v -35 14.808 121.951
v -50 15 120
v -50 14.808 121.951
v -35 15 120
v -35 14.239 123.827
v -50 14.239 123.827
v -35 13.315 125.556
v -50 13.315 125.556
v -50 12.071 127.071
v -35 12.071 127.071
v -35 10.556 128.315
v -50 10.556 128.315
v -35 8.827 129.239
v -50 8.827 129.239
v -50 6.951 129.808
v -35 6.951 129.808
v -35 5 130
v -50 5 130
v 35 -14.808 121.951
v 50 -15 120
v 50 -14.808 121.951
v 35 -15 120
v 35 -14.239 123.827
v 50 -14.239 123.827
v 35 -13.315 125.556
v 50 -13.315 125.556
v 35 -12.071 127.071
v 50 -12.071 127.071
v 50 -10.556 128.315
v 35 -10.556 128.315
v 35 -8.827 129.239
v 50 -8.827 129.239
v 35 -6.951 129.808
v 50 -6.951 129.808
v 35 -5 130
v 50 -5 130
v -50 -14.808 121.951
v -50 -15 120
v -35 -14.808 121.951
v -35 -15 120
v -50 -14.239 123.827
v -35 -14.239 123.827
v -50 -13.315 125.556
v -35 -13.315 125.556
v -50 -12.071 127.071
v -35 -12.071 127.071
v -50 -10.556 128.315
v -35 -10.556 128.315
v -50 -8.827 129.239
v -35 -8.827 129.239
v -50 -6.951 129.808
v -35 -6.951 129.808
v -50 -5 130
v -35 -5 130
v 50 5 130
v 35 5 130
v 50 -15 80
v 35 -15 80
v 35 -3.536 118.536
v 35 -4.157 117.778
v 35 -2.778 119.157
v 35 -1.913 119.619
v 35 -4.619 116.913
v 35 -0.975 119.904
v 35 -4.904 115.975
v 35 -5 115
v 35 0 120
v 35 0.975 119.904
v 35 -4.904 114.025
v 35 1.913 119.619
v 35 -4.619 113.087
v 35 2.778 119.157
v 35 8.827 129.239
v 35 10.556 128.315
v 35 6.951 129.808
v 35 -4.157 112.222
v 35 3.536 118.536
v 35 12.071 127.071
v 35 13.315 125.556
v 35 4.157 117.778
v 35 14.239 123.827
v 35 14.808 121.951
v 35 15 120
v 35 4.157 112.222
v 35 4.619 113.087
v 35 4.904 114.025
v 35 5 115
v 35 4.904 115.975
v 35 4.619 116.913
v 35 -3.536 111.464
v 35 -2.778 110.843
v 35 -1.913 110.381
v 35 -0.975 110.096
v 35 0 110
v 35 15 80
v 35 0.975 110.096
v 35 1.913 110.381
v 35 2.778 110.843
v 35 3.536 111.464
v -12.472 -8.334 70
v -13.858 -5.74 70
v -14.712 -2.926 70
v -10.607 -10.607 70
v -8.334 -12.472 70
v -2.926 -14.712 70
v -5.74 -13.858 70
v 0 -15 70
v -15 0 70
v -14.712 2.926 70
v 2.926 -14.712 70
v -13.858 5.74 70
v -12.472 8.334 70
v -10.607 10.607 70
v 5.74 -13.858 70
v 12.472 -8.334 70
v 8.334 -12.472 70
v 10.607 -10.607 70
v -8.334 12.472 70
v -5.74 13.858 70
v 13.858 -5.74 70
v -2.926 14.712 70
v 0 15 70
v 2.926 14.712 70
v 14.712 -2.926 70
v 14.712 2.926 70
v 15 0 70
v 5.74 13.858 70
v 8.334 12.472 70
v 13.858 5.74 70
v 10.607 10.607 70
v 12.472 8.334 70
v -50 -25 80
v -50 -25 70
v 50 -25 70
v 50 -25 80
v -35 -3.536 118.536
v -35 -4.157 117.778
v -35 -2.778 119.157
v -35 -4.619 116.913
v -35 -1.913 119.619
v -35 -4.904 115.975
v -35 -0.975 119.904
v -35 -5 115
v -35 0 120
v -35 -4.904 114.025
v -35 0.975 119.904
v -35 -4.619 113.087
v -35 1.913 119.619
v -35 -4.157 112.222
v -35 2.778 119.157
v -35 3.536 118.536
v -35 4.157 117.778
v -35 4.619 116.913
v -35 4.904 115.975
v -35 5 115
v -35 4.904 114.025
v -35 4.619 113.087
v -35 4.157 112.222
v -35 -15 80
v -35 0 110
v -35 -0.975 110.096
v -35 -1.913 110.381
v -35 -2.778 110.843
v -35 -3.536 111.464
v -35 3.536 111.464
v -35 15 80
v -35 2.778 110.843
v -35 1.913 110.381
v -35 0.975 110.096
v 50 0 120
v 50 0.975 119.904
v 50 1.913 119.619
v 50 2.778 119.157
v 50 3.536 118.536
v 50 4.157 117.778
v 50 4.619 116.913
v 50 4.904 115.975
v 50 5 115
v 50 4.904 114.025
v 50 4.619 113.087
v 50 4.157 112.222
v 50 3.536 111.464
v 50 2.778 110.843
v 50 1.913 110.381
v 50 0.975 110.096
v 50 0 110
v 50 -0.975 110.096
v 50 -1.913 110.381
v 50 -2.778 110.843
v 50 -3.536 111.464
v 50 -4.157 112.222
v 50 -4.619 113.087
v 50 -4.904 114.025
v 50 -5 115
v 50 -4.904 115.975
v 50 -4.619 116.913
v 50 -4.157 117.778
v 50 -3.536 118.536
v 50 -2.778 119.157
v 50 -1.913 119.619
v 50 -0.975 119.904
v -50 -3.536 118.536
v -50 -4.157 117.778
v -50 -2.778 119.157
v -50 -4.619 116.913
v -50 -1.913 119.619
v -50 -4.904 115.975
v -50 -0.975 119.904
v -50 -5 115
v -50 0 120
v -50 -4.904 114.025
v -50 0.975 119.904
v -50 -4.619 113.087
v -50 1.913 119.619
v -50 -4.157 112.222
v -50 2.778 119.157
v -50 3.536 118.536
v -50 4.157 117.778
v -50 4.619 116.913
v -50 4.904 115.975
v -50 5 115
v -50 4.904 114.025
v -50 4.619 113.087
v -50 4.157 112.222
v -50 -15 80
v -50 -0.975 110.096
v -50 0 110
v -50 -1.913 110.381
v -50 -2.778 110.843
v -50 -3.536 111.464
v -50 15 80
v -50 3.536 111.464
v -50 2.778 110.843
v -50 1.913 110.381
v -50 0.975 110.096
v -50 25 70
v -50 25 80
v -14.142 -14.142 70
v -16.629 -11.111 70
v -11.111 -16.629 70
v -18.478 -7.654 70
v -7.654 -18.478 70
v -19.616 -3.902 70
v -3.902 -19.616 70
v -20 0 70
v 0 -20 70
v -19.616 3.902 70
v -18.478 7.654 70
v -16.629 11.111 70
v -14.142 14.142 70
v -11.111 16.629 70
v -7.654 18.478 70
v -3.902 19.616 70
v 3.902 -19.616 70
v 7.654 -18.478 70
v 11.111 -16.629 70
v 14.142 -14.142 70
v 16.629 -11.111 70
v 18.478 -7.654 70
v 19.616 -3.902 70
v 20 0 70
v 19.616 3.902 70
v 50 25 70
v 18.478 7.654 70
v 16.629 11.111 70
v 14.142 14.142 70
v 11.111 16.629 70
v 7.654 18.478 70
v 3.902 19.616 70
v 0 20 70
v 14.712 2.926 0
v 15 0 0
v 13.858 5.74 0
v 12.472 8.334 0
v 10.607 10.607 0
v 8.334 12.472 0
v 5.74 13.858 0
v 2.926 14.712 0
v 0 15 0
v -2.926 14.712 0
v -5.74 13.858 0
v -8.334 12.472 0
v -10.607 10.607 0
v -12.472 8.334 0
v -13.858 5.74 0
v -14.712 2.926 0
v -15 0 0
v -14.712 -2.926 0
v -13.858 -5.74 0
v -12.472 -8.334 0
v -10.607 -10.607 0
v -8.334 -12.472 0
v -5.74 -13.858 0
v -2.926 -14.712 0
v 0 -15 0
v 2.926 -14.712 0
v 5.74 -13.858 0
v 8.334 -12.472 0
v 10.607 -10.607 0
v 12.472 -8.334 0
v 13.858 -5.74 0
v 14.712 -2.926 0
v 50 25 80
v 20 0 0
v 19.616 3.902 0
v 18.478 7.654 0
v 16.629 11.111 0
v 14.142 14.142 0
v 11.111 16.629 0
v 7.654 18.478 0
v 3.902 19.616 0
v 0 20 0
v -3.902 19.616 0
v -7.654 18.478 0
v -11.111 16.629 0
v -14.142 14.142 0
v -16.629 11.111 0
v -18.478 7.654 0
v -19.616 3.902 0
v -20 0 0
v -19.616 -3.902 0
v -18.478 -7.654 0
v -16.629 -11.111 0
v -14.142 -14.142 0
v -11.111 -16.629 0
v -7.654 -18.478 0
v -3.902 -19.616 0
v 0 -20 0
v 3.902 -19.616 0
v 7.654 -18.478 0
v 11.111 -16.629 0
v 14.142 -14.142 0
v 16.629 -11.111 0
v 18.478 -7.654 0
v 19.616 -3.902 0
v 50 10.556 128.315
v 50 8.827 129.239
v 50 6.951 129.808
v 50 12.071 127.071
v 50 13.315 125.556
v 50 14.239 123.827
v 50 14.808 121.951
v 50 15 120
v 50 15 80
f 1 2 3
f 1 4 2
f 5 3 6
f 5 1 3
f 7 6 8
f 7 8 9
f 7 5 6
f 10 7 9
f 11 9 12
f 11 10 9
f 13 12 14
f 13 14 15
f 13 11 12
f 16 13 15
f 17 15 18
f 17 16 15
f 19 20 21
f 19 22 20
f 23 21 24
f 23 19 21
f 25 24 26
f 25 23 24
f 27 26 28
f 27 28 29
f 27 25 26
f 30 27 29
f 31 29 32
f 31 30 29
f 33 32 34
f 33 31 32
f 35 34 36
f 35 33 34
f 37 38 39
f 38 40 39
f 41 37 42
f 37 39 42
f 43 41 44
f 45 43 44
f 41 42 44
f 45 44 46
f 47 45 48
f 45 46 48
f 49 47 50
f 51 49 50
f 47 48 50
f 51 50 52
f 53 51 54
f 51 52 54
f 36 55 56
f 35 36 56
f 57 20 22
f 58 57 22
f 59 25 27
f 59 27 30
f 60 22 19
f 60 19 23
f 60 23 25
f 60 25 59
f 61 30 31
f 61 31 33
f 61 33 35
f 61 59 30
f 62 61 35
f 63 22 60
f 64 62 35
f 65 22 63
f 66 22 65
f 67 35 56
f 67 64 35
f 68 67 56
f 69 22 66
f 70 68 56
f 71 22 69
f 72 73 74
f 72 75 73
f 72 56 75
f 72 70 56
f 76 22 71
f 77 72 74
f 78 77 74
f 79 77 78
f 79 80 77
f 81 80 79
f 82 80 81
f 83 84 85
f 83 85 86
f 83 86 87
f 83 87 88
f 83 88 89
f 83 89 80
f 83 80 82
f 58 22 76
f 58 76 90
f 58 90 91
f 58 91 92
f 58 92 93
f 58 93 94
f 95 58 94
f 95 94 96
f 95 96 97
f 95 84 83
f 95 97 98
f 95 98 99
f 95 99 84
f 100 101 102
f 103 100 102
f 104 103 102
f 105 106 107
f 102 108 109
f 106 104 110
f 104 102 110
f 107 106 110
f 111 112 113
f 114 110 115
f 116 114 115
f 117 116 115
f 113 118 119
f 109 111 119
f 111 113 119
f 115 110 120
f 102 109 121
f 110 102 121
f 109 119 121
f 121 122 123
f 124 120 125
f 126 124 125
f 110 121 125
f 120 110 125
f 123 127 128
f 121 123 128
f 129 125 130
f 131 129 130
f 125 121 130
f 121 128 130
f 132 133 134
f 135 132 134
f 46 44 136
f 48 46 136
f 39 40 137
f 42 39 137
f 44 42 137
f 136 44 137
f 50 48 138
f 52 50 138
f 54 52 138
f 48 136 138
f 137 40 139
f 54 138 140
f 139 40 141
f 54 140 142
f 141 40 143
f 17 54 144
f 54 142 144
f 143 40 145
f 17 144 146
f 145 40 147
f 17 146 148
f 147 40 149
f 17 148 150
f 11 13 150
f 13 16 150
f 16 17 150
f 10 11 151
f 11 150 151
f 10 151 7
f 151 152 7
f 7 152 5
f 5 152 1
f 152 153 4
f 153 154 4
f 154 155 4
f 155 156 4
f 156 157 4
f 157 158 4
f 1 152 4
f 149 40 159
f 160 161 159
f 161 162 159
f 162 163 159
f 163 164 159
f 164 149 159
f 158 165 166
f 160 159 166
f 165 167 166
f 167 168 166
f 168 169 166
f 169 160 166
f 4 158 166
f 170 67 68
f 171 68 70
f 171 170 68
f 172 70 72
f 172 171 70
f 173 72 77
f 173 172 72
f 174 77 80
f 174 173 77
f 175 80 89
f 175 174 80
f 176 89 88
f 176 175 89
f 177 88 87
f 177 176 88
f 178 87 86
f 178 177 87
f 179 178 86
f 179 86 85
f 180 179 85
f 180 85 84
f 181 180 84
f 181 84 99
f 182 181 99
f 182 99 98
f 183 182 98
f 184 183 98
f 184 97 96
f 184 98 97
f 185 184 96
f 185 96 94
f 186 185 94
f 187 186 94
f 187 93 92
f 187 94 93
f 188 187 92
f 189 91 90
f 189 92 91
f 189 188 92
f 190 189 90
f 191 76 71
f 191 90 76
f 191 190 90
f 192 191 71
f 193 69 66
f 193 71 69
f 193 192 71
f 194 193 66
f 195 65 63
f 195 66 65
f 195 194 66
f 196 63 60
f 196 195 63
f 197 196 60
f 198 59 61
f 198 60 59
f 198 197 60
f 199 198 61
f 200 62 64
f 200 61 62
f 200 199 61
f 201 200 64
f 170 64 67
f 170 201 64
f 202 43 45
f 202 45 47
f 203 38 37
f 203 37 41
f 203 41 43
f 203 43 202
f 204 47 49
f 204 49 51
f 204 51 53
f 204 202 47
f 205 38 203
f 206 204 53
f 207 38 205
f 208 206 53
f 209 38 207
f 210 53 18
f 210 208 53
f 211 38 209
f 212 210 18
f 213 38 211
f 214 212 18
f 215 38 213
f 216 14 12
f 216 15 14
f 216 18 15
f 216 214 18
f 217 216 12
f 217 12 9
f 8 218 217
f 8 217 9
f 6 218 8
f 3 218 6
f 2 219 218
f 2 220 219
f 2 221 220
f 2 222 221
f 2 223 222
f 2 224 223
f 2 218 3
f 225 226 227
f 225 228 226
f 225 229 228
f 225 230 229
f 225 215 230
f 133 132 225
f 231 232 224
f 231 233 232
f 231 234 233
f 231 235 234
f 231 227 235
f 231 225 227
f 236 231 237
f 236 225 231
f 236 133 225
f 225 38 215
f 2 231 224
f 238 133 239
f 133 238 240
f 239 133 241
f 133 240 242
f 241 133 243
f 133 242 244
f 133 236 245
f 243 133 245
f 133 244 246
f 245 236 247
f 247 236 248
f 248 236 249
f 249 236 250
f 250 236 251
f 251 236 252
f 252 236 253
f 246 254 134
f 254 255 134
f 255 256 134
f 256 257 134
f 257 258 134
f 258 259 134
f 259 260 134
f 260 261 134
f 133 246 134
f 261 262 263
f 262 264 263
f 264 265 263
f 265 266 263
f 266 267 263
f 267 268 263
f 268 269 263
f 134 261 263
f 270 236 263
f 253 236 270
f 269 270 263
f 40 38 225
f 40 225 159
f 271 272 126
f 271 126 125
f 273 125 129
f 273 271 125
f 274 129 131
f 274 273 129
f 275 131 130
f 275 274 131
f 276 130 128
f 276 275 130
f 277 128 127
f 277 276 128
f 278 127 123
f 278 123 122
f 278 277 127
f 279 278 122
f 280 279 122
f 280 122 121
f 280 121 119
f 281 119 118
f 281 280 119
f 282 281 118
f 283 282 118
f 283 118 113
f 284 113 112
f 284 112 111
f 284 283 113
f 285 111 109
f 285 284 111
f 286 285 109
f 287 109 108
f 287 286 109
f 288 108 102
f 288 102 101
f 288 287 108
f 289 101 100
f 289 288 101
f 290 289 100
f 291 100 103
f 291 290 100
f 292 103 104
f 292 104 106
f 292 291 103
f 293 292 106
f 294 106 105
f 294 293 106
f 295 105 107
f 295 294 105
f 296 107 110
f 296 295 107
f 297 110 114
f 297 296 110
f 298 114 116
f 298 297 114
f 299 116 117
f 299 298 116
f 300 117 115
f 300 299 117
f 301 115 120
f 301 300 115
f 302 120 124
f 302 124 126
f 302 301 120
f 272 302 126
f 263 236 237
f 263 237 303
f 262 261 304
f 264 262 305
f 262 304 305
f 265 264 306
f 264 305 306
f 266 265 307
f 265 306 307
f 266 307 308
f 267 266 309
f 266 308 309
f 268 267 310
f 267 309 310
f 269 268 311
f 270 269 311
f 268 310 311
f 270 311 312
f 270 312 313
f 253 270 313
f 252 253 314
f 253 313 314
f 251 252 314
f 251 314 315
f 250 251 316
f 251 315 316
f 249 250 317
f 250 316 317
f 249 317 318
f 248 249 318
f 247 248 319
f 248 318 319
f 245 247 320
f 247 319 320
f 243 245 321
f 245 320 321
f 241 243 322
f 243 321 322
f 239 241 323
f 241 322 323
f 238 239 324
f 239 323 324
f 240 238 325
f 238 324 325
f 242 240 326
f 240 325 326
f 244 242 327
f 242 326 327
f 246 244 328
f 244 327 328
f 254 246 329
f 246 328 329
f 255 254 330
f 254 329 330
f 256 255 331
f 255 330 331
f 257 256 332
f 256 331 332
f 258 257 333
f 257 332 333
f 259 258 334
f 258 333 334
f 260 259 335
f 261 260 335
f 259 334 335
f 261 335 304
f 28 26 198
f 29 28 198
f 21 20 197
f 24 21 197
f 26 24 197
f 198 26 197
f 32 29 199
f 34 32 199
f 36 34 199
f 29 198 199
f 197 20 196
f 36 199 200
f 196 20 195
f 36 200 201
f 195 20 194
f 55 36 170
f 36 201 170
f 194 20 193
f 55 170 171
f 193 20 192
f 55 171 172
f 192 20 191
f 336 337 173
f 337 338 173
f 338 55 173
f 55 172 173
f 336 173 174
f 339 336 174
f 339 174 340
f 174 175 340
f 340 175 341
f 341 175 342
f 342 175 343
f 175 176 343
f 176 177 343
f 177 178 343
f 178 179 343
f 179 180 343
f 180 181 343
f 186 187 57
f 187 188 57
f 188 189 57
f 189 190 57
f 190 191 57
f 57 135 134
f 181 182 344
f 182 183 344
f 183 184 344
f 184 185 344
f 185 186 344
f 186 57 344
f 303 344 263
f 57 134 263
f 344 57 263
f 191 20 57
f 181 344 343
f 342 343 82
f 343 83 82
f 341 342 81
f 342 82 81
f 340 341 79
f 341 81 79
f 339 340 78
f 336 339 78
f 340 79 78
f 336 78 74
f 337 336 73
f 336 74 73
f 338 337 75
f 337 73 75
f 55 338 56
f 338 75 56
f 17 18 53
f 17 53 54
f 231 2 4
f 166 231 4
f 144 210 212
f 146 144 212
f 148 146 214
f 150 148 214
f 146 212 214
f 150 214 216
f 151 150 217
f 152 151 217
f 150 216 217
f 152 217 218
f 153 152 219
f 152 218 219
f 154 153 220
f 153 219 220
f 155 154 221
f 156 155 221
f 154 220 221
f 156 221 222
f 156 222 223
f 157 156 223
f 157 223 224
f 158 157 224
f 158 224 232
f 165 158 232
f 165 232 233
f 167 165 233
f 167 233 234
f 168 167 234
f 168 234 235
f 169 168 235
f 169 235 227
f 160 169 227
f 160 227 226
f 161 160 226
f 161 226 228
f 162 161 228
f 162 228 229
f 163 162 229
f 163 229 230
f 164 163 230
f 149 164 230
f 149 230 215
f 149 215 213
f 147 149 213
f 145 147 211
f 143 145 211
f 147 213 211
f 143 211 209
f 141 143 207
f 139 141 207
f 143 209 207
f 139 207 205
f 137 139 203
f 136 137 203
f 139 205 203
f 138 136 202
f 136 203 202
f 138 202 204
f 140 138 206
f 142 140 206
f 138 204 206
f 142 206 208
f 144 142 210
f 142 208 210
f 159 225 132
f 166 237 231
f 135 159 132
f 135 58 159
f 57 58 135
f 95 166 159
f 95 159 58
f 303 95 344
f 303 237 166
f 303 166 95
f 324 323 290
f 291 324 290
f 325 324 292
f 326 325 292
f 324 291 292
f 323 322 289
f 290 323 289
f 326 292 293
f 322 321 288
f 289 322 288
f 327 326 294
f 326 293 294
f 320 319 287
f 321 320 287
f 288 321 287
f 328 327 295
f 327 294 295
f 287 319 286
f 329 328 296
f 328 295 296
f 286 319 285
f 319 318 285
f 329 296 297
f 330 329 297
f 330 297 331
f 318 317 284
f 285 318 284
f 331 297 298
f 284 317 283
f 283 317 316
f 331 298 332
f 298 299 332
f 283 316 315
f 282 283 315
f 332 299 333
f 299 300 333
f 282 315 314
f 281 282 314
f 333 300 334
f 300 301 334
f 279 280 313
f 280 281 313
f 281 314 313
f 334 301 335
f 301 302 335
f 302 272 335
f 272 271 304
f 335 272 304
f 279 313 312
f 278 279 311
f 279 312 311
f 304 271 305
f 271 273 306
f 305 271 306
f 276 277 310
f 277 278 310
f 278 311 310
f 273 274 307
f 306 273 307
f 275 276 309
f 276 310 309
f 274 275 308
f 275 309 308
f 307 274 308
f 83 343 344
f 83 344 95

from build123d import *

# Parameters (mm, degrees)
SKETCH_1_R             = 20
SKETCH_1_R_2           = 15
EXTRUDE_1_DEPTH        = 70
SKETCH_2_W             = 100
SKETCH_2_H             = 50
EXTRUDE_2_DEPTH        = 10
SKETCH_3_W             = 15
SKETCH_3_H             = 30
EXTRUDE_3_DEPTH        = 50
FILLET_1_R             = 10
SKETCH_4_R             = 5
CUT_EXTRUDE_1_DEPTH    = 50
FILLET_1_OF_MIRROR_2_R = 10


with BuildPart() as part:
    # Эскиз1 → Бобышка-Вытянуть1 (new body)
    with BuildSketch(Plane.XY):
        Circle(SKETCH_1_R)
        Circle(SKETCH_1_R_2, mode=Mode.SUBTRACT)
    extrude(amount=EXTRUDE_1_DEPTH)

    # Эскиз2 → Бобышка-Вытянуть2 (add)
    with BuildSketch(Plane.XY.offset(70)):
        Rectangle(SKETCH_2_W, SKETCH_2_H)
    extrude(amount=EXTRUDE_2_DEPTH)

    # Эскиз3 → Бобышка-Вытянуть3 (add)
    with BuildSketch(Plane.XY.offset(80)):
        with Locations((-42.5, 0)):
            Rectangle(SKETCH_3_W, SKETCH_3_H)
    extrude_3 = extrude(amount=EXTRUDE_3_DEPTH)

    # Скругление1
    fillet_1_edges = [part.edges().sort_by_distance(p)[0] for p in [
        (-42.5, 15, 130),
        (-42.5, -15, 130),
    ]]
    fillet(fillet_1_edges, radius=FILLET_1_R)

    # Эскиз4 → Вырез-Вытянуть1 (cut)
    with BuildSketch(Plane.ZY.offset(50)):
        with Locations((115, 0)):
            Circle(SKETCH_4_R)
    cut_extrude_1 = extrude(amount=-CUT_EXTRUDE_1_DEPTH, mode=Mode.SUBTRACT)

    # Зеркальное отражение2: Бобышка-Вытянуть3, Вырез-Вытянуть1 across plane
    add(extrude_3.mirror(Plane(origin=(0, 0, 0), x_dir=(0, 0, 1), z_dir=(1, 0, 0))))
    add(cut_extrude_1.mirror(Plane(origin=(0, 0, 0), x_dir=(0, 0, 1), z_dir=(1, 0, 0))), mode=Mode.SUBTRACT)

    # Скругление1 of Зеркальное отражение2
    fillet_1_of_mirror_2_edges = [part.edges().sort_by_distance(p)[0] for p in [
        (42.5, 15, 130),
        (42.5, -15, 130),
    ]]
    fillet(fillet_1_of_mirror_2_edges, radius=FILLET_1_OF_MIRROR_2_R)


solid = part.part
